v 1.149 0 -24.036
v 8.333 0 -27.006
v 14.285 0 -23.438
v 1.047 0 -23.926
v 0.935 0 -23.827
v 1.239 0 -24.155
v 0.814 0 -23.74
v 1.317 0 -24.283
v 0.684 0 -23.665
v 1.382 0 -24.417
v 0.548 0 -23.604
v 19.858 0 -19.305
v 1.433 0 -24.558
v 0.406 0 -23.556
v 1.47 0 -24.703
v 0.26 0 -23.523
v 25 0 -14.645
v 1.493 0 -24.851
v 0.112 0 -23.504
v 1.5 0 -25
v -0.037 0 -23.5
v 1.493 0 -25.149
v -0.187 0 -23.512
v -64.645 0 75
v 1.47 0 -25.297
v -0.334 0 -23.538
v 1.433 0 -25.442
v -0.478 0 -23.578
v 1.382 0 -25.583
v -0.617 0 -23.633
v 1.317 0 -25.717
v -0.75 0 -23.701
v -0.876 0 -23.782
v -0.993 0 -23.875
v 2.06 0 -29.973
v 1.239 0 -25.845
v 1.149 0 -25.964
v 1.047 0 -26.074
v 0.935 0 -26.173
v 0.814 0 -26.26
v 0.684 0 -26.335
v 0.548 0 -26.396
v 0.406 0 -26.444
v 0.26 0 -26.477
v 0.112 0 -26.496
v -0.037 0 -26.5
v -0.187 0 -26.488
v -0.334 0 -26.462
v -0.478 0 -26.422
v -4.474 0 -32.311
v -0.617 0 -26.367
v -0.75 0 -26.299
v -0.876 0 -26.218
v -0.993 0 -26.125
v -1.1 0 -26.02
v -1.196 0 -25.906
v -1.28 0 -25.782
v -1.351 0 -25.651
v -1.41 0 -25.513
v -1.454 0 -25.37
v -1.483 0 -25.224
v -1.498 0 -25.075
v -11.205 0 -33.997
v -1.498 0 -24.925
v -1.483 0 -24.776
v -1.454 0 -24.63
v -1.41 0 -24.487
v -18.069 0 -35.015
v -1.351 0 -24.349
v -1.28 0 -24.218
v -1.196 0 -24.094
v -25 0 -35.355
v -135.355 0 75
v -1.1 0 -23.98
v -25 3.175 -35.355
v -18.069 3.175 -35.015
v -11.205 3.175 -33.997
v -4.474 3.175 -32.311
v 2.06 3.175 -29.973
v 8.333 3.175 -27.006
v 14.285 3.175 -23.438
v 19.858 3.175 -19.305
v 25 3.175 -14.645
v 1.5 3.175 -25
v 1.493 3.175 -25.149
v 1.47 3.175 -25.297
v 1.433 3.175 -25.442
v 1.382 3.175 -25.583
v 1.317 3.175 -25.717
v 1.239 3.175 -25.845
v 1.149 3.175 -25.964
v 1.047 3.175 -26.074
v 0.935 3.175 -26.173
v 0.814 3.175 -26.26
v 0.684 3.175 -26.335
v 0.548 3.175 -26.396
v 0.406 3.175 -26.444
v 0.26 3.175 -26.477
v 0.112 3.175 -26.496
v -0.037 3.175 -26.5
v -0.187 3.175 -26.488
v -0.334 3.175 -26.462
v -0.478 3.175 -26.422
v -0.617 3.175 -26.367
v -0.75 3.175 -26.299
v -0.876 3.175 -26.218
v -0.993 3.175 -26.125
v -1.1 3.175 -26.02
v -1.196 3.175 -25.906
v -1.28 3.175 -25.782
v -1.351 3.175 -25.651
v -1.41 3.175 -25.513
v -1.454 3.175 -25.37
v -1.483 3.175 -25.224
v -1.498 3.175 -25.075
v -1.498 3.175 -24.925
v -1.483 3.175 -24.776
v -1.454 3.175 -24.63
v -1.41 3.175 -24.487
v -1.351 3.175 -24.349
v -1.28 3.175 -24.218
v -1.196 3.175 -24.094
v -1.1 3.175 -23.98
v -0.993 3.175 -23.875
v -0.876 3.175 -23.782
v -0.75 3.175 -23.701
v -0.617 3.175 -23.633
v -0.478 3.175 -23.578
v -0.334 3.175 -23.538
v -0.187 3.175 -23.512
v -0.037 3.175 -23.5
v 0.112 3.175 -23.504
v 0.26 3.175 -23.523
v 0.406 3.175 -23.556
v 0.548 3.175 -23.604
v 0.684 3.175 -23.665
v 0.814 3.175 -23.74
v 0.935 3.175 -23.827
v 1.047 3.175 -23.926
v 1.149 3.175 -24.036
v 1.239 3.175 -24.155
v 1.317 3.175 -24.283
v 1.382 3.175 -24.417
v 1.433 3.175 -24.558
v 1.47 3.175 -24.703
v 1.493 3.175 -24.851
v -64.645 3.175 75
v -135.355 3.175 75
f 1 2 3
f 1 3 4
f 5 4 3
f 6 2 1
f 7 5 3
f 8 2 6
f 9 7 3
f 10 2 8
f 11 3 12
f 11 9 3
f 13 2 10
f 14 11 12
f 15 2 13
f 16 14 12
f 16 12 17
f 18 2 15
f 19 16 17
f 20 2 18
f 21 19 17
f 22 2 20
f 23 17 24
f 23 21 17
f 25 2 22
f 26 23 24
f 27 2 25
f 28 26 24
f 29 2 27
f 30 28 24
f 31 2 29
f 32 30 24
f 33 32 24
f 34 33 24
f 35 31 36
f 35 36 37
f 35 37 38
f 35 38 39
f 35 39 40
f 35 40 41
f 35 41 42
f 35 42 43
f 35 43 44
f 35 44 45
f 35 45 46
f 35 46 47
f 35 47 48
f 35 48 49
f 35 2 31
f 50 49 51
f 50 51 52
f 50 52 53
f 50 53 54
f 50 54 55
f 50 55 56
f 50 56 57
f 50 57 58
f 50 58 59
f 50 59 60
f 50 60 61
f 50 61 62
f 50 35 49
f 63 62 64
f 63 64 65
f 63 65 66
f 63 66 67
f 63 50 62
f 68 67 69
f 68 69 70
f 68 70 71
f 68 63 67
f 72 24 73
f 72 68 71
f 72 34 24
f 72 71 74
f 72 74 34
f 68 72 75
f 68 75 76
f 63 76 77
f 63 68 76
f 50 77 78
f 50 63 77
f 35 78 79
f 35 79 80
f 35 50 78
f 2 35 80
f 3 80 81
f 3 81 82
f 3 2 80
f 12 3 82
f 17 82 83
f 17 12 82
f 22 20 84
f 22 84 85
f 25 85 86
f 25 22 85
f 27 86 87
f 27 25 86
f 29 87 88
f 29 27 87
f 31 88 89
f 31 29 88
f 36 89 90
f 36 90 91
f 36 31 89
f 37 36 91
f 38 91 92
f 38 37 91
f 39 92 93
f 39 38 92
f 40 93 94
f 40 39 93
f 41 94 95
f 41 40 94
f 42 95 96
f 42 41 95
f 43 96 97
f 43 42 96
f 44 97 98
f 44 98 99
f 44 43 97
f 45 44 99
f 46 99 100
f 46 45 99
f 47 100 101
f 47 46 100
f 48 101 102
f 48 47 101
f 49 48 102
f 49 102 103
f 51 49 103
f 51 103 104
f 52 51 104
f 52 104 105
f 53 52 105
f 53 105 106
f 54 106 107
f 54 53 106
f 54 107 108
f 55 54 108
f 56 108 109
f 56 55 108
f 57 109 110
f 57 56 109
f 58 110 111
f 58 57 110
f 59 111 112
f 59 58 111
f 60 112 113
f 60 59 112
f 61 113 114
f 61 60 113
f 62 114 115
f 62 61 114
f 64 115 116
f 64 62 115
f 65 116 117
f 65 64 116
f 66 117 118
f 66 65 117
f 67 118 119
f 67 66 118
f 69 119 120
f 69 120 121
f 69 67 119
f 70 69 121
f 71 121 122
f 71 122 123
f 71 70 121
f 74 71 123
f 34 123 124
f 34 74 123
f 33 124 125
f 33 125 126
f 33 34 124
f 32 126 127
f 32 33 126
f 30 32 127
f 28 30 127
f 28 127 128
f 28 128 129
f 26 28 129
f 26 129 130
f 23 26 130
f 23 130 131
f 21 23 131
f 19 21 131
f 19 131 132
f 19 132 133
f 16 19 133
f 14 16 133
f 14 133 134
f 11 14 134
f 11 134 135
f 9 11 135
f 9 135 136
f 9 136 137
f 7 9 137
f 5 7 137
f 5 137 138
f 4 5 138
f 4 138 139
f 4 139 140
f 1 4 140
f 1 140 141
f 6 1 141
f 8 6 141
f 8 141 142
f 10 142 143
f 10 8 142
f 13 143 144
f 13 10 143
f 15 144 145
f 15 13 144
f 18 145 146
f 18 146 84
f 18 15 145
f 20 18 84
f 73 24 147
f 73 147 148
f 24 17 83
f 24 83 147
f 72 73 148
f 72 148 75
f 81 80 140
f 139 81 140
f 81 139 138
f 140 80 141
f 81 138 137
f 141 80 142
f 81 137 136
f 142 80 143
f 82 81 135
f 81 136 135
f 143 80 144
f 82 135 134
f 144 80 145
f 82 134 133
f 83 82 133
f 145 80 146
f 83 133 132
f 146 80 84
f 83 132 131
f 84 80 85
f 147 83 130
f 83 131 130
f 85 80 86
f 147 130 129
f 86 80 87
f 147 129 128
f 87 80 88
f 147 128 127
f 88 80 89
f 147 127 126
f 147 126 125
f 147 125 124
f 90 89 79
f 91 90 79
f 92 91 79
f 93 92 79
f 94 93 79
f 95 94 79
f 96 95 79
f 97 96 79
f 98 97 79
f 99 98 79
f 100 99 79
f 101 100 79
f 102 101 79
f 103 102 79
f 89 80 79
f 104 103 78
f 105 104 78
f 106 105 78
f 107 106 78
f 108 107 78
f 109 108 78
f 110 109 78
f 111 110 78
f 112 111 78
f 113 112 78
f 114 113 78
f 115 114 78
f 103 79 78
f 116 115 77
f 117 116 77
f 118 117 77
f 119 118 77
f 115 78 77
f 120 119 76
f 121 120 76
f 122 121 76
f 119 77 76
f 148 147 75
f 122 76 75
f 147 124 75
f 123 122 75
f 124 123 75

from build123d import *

# Parameters (mm, degrees)
SKETCH1_R           = 1.5
BOSS_EXTRUDE1_DEPTH = 3.175


with BuildPart() as part:
    # Sketch1 → Boss-Extrude1 (new body)
    with BuildSketch(Plane(origin=(0, 0, 0), x_dir=(1, 0, 0), z_dir=(0, 1, 0))):
        with BuildLine():
            ThreePointArc((-25, 35.355339059), (2.059805007, 29.972809184), (25, 14.644660941))
            Line((25, 14.644660941), (-64.644660941, -75))
            Line((-64.644660941, -75), (-135.355339059, -75))
            Line((-135.355339059, -75), (-25, 35.355339059))
        make_face()
        with Locations((0, 25)):
            Circle(SKETCH1_R, mode=Mode.SUBTRACT)
    extrude(amount=BOSS_EXTRUDE1_DEPTH)


solid = part.part
